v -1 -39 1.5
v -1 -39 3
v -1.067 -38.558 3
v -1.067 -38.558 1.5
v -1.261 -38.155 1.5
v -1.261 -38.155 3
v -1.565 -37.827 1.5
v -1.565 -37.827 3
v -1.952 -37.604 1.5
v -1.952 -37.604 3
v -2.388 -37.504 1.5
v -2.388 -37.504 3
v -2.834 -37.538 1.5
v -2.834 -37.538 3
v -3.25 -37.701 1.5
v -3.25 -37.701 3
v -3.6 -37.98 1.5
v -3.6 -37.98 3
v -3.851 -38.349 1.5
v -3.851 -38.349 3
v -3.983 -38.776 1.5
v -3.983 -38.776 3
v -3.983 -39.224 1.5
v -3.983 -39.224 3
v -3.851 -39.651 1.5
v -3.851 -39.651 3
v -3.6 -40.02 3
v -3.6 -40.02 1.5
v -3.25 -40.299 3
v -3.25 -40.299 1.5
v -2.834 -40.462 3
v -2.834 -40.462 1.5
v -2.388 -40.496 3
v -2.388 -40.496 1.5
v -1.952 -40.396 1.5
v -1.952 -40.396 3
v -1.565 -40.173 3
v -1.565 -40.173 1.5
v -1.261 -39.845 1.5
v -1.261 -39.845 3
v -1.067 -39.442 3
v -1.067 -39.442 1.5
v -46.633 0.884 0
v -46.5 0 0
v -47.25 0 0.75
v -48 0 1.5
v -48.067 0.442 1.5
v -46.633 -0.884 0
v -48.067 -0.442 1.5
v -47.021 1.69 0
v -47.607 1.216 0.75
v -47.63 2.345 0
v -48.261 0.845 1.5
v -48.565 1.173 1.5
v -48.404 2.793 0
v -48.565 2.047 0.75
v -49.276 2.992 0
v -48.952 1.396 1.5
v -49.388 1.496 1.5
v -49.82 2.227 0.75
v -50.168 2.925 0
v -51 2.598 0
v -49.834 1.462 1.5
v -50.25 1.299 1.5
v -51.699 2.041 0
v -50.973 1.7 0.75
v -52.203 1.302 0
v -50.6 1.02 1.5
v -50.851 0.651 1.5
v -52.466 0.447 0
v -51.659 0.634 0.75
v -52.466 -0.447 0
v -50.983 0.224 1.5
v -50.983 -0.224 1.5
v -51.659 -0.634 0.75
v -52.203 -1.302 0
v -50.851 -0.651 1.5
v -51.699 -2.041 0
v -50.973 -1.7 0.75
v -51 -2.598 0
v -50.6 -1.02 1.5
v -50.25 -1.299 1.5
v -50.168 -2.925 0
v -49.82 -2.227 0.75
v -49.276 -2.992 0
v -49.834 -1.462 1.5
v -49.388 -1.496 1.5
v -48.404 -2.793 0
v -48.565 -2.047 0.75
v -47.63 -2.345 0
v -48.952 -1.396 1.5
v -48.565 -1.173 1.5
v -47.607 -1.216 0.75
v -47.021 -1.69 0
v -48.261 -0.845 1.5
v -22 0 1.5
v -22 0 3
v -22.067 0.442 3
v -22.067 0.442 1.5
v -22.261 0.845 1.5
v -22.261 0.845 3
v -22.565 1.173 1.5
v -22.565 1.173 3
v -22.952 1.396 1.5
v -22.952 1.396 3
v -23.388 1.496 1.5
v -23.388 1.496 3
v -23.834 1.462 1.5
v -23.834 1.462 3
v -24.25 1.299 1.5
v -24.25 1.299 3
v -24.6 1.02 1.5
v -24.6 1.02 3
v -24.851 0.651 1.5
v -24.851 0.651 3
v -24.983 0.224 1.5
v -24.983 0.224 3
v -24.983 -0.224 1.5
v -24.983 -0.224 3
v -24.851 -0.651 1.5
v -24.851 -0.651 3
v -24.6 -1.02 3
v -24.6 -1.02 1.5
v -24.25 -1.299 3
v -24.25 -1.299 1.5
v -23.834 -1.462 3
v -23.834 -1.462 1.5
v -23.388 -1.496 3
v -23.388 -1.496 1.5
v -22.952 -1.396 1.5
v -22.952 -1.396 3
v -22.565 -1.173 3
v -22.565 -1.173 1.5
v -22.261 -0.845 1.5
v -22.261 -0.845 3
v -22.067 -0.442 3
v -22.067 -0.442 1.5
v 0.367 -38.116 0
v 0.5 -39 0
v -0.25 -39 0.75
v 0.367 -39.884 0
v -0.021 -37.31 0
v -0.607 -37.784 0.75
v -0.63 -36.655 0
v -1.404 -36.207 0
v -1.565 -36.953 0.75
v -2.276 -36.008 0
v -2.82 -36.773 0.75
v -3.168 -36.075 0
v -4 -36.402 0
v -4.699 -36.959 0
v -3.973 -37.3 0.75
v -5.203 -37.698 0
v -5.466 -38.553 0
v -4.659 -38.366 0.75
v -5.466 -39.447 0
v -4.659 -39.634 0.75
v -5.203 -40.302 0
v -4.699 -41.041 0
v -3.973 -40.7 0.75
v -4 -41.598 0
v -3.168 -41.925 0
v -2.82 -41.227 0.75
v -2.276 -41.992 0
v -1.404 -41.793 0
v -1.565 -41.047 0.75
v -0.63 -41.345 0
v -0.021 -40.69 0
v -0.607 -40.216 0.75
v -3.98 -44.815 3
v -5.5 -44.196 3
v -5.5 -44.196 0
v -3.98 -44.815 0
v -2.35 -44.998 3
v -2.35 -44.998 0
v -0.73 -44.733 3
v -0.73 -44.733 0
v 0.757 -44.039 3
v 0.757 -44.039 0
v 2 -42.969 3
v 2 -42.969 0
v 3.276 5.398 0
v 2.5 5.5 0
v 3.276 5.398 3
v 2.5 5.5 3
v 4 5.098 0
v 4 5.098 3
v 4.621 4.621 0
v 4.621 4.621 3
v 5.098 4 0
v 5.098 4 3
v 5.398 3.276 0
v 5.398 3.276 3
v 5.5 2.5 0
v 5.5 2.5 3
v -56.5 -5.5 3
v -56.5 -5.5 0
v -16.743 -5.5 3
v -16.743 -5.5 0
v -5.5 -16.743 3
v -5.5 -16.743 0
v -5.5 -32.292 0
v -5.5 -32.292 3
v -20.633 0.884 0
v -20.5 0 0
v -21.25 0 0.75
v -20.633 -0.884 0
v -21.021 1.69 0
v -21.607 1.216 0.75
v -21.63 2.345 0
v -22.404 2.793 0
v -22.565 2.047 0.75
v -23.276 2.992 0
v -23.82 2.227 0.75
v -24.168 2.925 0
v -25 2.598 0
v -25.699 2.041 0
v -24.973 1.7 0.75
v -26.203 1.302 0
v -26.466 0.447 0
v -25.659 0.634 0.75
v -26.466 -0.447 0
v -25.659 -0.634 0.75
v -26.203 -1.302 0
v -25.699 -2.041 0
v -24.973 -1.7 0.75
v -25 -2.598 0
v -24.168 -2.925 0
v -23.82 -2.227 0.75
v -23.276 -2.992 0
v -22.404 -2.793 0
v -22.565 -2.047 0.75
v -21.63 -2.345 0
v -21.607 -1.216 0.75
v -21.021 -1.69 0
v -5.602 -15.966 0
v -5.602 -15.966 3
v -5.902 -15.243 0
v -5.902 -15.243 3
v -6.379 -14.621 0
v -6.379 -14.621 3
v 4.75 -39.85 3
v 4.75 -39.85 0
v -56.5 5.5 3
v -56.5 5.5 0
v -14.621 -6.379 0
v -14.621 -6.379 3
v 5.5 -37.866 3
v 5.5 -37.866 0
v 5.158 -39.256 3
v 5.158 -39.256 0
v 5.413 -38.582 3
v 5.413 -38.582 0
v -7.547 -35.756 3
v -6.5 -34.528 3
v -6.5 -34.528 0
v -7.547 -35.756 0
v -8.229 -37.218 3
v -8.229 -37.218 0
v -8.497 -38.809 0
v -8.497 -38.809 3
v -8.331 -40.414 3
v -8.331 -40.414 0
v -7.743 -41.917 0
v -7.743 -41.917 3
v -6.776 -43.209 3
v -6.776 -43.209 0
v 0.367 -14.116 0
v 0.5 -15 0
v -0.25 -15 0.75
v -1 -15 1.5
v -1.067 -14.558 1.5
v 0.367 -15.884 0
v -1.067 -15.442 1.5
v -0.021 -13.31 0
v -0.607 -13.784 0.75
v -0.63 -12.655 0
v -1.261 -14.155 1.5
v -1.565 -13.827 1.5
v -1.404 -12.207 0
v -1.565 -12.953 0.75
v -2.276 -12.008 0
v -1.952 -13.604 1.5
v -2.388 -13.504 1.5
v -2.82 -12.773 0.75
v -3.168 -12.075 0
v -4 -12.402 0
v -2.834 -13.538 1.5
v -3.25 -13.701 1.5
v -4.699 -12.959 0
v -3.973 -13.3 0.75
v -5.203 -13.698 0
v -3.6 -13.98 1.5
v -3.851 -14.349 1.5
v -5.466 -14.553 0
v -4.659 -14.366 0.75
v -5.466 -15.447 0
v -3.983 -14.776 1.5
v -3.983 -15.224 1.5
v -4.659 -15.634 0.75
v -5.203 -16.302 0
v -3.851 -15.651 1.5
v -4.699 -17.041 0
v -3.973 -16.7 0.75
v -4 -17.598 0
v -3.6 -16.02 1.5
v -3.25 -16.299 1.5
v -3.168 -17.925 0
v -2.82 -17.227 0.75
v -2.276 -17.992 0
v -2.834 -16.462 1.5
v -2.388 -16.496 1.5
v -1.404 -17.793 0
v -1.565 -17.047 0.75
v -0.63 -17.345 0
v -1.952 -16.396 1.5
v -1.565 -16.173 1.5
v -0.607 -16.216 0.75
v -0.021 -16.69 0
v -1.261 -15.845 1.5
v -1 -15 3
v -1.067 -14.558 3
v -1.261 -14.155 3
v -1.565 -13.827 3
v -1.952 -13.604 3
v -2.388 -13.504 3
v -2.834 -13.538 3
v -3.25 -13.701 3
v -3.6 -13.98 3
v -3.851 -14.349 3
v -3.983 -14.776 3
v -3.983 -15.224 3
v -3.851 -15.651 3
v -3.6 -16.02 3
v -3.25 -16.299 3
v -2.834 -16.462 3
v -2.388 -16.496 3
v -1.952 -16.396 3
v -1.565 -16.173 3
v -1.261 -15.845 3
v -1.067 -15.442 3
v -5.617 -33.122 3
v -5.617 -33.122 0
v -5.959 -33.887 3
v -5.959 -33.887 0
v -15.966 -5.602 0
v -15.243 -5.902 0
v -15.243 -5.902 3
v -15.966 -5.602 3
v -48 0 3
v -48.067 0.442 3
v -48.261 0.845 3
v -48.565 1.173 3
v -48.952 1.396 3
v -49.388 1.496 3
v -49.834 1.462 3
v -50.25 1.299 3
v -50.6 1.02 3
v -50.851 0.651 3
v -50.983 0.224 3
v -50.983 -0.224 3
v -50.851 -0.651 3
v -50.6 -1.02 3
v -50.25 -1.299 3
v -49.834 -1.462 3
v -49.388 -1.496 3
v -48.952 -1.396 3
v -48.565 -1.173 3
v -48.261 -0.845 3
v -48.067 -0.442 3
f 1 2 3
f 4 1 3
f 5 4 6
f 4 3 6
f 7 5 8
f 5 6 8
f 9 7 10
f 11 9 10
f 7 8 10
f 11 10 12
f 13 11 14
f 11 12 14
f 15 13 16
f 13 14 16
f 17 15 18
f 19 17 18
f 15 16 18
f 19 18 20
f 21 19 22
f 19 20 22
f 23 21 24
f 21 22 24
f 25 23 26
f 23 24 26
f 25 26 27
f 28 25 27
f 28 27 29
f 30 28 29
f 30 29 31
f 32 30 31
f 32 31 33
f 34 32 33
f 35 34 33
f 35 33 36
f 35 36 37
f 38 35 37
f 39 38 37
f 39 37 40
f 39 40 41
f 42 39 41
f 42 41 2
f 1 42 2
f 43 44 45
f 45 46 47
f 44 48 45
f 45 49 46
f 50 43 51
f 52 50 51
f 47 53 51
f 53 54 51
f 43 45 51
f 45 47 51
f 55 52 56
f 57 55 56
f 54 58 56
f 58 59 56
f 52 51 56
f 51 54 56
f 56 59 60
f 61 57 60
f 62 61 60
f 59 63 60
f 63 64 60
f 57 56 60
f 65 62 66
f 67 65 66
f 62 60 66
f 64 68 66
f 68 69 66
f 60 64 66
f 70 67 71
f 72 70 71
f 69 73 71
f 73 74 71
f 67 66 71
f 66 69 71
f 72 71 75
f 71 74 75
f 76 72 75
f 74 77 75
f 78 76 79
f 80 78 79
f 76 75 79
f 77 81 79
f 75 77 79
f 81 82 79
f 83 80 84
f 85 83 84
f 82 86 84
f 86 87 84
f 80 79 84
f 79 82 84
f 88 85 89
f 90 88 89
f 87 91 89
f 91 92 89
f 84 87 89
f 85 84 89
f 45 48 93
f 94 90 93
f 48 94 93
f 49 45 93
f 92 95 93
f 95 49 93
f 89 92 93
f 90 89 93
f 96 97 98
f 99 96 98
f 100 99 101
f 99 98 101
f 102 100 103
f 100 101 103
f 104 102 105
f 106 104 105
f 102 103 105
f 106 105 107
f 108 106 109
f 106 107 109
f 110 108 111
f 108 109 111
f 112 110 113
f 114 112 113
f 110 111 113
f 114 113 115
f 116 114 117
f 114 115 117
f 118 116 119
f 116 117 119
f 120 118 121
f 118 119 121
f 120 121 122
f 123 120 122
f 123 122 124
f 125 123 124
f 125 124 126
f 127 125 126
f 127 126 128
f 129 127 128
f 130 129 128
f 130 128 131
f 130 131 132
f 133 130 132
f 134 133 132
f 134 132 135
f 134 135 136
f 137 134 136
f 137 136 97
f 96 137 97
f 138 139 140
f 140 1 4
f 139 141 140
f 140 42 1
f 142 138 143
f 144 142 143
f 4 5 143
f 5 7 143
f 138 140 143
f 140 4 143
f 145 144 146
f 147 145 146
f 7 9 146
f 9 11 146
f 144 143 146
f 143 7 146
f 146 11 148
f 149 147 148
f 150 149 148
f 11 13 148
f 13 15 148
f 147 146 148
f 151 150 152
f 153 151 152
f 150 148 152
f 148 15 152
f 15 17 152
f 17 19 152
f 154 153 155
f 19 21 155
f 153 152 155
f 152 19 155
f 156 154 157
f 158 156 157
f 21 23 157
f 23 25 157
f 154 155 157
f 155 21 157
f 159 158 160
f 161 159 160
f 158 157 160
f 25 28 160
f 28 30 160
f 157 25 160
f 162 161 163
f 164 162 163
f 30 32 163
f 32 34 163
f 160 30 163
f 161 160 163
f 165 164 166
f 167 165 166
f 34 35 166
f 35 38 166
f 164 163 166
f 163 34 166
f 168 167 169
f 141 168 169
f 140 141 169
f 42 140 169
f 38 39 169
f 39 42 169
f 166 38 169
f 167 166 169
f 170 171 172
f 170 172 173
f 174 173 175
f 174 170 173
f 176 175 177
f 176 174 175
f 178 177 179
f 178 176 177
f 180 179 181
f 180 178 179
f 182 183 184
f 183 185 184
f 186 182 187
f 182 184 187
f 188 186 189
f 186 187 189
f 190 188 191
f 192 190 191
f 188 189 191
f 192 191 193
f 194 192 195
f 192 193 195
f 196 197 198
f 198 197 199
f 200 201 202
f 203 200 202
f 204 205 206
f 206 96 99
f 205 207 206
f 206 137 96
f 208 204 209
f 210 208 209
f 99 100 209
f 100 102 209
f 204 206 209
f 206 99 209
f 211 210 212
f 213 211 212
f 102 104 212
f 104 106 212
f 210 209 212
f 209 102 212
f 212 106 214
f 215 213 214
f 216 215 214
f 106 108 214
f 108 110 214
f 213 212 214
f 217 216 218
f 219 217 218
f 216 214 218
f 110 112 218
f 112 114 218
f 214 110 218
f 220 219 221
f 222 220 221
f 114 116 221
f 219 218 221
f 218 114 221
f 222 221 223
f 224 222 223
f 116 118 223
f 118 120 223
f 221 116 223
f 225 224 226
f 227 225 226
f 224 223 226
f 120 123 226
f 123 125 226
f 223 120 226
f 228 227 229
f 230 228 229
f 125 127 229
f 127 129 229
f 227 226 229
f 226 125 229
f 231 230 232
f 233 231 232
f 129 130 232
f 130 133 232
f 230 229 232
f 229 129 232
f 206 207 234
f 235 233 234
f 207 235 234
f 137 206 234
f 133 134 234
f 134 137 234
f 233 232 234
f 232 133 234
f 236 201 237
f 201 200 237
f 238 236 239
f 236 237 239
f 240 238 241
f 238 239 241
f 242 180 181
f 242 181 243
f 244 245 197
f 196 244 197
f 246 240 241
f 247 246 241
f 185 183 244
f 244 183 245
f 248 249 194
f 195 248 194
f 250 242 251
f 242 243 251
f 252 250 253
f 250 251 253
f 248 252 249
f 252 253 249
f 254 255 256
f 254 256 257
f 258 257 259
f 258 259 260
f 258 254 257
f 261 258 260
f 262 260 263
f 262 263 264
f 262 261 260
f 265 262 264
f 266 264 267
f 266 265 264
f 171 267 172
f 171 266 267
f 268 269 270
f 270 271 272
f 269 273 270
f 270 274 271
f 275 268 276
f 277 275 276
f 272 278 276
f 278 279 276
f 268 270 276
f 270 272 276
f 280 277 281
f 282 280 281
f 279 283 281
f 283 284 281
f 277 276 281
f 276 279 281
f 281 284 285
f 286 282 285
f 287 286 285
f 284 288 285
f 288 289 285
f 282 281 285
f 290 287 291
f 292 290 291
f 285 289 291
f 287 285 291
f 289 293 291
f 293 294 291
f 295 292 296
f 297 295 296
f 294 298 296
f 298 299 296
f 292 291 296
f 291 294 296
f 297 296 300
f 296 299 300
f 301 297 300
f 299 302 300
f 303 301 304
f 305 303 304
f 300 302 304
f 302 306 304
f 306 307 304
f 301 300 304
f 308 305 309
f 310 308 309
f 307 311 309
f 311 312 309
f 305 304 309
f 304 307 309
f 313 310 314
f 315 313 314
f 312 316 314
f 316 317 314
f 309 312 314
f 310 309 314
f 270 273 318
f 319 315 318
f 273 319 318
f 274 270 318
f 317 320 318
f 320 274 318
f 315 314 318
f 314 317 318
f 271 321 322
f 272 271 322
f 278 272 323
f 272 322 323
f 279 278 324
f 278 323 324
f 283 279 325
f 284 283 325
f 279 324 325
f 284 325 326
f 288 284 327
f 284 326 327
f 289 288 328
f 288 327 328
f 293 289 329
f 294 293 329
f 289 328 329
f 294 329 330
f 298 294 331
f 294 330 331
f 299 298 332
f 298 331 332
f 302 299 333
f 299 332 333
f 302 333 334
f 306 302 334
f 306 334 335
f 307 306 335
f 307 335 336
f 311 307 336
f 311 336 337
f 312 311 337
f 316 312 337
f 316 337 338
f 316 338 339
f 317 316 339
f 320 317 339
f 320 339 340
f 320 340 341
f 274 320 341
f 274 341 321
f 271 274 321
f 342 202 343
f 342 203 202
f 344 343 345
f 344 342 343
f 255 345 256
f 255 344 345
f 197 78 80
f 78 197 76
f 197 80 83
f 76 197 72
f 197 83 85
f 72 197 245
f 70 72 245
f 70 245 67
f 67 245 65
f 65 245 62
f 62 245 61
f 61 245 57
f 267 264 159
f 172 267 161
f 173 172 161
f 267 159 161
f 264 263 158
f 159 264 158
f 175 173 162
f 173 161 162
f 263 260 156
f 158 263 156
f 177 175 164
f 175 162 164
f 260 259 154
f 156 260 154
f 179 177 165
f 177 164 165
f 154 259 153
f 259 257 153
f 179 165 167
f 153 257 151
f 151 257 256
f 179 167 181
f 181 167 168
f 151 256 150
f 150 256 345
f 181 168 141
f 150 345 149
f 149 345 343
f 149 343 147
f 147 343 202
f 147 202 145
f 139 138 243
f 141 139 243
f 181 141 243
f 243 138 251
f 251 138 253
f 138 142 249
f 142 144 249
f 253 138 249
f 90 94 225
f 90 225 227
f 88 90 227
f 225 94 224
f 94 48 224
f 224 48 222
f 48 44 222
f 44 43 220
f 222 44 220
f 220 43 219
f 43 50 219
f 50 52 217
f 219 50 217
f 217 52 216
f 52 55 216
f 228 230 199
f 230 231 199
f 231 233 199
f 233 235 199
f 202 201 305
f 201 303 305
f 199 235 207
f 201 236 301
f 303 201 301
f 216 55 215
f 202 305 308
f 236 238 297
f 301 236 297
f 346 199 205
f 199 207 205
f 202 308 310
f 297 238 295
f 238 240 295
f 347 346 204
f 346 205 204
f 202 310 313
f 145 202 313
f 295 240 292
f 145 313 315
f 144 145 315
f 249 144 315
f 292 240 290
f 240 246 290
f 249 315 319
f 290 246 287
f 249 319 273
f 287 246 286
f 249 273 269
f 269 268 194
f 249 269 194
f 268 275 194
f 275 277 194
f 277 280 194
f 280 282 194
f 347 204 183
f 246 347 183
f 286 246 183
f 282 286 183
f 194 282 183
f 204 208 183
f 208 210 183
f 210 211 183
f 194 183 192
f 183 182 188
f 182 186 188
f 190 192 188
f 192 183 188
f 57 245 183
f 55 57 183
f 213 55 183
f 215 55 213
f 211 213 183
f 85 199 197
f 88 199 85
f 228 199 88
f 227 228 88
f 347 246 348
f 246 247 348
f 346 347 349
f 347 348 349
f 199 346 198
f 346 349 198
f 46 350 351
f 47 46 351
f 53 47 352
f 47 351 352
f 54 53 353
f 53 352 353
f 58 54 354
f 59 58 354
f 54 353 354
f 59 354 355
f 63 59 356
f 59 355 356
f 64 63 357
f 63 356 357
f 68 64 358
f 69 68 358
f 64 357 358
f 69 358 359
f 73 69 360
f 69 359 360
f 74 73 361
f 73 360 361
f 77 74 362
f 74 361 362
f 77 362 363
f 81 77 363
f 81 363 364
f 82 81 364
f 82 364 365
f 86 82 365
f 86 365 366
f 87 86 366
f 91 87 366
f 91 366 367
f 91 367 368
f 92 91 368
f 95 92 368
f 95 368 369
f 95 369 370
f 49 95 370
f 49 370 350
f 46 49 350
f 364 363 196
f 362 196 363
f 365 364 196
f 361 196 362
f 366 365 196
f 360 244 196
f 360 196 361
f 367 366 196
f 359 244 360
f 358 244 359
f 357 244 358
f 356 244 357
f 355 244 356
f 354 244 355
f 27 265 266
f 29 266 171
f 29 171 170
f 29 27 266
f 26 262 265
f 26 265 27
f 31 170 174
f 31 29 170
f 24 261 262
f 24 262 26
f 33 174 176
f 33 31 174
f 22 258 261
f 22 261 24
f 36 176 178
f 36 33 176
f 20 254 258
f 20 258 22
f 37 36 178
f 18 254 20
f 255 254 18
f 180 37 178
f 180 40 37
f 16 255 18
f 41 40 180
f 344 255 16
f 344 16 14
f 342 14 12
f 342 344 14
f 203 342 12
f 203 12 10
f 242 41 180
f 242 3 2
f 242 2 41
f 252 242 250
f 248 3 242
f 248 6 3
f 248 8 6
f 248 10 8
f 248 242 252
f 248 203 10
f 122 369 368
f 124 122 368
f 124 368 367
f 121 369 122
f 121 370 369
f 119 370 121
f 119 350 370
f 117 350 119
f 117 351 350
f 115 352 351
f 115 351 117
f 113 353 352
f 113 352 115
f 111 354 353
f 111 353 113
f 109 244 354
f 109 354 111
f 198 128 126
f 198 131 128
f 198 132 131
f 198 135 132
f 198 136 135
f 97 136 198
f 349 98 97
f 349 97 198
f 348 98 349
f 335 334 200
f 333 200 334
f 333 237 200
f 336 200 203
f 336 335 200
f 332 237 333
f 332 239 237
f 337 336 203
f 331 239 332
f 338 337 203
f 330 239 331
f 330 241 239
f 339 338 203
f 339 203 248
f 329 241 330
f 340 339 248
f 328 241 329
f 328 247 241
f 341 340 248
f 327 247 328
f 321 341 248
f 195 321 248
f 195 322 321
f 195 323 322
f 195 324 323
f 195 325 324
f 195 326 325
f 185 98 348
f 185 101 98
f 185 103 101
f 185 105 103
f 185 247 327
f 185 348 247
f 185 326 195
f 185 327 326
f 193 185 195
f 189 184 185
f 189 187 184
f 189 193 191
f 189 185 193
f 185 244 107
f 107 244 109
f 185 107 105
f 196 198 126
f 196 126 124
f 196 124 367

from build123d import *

# Parameters (mm, degrees)
EXTRUDE_598_DEPTH      = 3
SKETCH_656_R           = 1.5
CUT_EXTRUDE_1014_DEPTH = 74.235920149
SKETCH_3_R             = 6
SKETCH_3_R_2           = 1.5
EXTRUDE_1306_DEPTH     = 3
CUT_EXTRUDE_1628_DEPTH = 74.235920149
CHAMFER_3_SIZE         = 10
FILLET_3_R             = 3
CHAMFER_2_SIZE         = 1.5


with BuildPart() as part:
    # Эскиз1 → Extrude 598 (new body)
    with BuildSketch(Plane.XY):
        Polygon((-56.5, 5.5), (-56.5, -5.5), (-5.5, -5.5), (-5.5, -46.5), (5.5, -46.5), (5.5, 5.5), align=None)
    extrude(amount=EXTRUDE_598_DEPTH)

    # Sketch 656 → Cut-Extrude 1014 (cut, through all)
    with BuildSketch(Plane.XY.offset(3)):
        with Locations((-49.5, 0)):
            Circle(SKETCH_656_R)
        with Locations((-23.5, 0)):
            Circle(SKETCH_656_R)
        with Locations((-2.5, -15)):
            Circle(SKETCH_656_R)
        with Locations((-2.5, -39)):
            Circle(SKETCH_656_R)
    extrude(amount=-CUT_EXTRUDE_1014_DEPTH, mode=Mode.SUBTRACT)

    # Эскиз3 → Extrude 1306 (add)
    with BuildSketch(Plane.XY.offset(3)):
        with Locations((-2.5, -39)):
            Circle(SKETCH_3_R)
        with Locations((-2.5, -39)):
            Circle(SKETCH_3_R_2, mode=Mode.SUBTRACT)
    extrude(amount=-EXTRUDE_1306_DEPTH)

    # Эскиз4 → Cut-Extrude 1628 (cut, through all)
    with BuildSketch(Plane.XY.offset(3)):
        with BuildLine():
            Line((-5.5, -46.5), (-5.5, -44.196152423))
            ThreePointArc((-5.5, -44.196152423), (-1.530874267, -44.921215696), (2, -42.968626967))
            Line((2, -42.968626967), (5.5, -39))
            Line((5.5, -39), (5.5, -46.5))
            Line((5.5, -46.5), (-5.5, -46.5))
        make_face()
    extrude(amount=-CUT_EXTRUDE_1628_DEPTH, mode=Mode.SUBTRACT)

    # Фаска3
    chamfer_3_edges = [part.edges().sort_by_distance(p)[0] for p in [
        (-5.5, -5.5, 1.5),
    ]]
    chamfer(chamfer_3_edges, length=CHAMFER_3_SIZE)

    # Скругление3
    fillet_3_edges = [part.edges().sort_by_distance(p)[0] for p in [
        (5.5, 5.5, 1.5),
        (-5.5, -33.803847577, 1.5),
        (5.5, -39, 1.5),
        (-5.5, -15.5, 1.5),
        (-15.5, -5.5, 1.5),
    ]]
    fillet(fillet_3_edges, radius=FILLET_3_R)

    # Фаска2
    chamfer_2_edges = [part.edges().sort_by_distance(p)[0] for p in [
        (-4, -15, 0),
        (-51, 0, 0),
        (-25, 0, 0),
        (-4, -39, 0),
    ]]
    chamfer(chamfer_2_edges, length=CHAMFER_2_SIZE)


solid = part.part
